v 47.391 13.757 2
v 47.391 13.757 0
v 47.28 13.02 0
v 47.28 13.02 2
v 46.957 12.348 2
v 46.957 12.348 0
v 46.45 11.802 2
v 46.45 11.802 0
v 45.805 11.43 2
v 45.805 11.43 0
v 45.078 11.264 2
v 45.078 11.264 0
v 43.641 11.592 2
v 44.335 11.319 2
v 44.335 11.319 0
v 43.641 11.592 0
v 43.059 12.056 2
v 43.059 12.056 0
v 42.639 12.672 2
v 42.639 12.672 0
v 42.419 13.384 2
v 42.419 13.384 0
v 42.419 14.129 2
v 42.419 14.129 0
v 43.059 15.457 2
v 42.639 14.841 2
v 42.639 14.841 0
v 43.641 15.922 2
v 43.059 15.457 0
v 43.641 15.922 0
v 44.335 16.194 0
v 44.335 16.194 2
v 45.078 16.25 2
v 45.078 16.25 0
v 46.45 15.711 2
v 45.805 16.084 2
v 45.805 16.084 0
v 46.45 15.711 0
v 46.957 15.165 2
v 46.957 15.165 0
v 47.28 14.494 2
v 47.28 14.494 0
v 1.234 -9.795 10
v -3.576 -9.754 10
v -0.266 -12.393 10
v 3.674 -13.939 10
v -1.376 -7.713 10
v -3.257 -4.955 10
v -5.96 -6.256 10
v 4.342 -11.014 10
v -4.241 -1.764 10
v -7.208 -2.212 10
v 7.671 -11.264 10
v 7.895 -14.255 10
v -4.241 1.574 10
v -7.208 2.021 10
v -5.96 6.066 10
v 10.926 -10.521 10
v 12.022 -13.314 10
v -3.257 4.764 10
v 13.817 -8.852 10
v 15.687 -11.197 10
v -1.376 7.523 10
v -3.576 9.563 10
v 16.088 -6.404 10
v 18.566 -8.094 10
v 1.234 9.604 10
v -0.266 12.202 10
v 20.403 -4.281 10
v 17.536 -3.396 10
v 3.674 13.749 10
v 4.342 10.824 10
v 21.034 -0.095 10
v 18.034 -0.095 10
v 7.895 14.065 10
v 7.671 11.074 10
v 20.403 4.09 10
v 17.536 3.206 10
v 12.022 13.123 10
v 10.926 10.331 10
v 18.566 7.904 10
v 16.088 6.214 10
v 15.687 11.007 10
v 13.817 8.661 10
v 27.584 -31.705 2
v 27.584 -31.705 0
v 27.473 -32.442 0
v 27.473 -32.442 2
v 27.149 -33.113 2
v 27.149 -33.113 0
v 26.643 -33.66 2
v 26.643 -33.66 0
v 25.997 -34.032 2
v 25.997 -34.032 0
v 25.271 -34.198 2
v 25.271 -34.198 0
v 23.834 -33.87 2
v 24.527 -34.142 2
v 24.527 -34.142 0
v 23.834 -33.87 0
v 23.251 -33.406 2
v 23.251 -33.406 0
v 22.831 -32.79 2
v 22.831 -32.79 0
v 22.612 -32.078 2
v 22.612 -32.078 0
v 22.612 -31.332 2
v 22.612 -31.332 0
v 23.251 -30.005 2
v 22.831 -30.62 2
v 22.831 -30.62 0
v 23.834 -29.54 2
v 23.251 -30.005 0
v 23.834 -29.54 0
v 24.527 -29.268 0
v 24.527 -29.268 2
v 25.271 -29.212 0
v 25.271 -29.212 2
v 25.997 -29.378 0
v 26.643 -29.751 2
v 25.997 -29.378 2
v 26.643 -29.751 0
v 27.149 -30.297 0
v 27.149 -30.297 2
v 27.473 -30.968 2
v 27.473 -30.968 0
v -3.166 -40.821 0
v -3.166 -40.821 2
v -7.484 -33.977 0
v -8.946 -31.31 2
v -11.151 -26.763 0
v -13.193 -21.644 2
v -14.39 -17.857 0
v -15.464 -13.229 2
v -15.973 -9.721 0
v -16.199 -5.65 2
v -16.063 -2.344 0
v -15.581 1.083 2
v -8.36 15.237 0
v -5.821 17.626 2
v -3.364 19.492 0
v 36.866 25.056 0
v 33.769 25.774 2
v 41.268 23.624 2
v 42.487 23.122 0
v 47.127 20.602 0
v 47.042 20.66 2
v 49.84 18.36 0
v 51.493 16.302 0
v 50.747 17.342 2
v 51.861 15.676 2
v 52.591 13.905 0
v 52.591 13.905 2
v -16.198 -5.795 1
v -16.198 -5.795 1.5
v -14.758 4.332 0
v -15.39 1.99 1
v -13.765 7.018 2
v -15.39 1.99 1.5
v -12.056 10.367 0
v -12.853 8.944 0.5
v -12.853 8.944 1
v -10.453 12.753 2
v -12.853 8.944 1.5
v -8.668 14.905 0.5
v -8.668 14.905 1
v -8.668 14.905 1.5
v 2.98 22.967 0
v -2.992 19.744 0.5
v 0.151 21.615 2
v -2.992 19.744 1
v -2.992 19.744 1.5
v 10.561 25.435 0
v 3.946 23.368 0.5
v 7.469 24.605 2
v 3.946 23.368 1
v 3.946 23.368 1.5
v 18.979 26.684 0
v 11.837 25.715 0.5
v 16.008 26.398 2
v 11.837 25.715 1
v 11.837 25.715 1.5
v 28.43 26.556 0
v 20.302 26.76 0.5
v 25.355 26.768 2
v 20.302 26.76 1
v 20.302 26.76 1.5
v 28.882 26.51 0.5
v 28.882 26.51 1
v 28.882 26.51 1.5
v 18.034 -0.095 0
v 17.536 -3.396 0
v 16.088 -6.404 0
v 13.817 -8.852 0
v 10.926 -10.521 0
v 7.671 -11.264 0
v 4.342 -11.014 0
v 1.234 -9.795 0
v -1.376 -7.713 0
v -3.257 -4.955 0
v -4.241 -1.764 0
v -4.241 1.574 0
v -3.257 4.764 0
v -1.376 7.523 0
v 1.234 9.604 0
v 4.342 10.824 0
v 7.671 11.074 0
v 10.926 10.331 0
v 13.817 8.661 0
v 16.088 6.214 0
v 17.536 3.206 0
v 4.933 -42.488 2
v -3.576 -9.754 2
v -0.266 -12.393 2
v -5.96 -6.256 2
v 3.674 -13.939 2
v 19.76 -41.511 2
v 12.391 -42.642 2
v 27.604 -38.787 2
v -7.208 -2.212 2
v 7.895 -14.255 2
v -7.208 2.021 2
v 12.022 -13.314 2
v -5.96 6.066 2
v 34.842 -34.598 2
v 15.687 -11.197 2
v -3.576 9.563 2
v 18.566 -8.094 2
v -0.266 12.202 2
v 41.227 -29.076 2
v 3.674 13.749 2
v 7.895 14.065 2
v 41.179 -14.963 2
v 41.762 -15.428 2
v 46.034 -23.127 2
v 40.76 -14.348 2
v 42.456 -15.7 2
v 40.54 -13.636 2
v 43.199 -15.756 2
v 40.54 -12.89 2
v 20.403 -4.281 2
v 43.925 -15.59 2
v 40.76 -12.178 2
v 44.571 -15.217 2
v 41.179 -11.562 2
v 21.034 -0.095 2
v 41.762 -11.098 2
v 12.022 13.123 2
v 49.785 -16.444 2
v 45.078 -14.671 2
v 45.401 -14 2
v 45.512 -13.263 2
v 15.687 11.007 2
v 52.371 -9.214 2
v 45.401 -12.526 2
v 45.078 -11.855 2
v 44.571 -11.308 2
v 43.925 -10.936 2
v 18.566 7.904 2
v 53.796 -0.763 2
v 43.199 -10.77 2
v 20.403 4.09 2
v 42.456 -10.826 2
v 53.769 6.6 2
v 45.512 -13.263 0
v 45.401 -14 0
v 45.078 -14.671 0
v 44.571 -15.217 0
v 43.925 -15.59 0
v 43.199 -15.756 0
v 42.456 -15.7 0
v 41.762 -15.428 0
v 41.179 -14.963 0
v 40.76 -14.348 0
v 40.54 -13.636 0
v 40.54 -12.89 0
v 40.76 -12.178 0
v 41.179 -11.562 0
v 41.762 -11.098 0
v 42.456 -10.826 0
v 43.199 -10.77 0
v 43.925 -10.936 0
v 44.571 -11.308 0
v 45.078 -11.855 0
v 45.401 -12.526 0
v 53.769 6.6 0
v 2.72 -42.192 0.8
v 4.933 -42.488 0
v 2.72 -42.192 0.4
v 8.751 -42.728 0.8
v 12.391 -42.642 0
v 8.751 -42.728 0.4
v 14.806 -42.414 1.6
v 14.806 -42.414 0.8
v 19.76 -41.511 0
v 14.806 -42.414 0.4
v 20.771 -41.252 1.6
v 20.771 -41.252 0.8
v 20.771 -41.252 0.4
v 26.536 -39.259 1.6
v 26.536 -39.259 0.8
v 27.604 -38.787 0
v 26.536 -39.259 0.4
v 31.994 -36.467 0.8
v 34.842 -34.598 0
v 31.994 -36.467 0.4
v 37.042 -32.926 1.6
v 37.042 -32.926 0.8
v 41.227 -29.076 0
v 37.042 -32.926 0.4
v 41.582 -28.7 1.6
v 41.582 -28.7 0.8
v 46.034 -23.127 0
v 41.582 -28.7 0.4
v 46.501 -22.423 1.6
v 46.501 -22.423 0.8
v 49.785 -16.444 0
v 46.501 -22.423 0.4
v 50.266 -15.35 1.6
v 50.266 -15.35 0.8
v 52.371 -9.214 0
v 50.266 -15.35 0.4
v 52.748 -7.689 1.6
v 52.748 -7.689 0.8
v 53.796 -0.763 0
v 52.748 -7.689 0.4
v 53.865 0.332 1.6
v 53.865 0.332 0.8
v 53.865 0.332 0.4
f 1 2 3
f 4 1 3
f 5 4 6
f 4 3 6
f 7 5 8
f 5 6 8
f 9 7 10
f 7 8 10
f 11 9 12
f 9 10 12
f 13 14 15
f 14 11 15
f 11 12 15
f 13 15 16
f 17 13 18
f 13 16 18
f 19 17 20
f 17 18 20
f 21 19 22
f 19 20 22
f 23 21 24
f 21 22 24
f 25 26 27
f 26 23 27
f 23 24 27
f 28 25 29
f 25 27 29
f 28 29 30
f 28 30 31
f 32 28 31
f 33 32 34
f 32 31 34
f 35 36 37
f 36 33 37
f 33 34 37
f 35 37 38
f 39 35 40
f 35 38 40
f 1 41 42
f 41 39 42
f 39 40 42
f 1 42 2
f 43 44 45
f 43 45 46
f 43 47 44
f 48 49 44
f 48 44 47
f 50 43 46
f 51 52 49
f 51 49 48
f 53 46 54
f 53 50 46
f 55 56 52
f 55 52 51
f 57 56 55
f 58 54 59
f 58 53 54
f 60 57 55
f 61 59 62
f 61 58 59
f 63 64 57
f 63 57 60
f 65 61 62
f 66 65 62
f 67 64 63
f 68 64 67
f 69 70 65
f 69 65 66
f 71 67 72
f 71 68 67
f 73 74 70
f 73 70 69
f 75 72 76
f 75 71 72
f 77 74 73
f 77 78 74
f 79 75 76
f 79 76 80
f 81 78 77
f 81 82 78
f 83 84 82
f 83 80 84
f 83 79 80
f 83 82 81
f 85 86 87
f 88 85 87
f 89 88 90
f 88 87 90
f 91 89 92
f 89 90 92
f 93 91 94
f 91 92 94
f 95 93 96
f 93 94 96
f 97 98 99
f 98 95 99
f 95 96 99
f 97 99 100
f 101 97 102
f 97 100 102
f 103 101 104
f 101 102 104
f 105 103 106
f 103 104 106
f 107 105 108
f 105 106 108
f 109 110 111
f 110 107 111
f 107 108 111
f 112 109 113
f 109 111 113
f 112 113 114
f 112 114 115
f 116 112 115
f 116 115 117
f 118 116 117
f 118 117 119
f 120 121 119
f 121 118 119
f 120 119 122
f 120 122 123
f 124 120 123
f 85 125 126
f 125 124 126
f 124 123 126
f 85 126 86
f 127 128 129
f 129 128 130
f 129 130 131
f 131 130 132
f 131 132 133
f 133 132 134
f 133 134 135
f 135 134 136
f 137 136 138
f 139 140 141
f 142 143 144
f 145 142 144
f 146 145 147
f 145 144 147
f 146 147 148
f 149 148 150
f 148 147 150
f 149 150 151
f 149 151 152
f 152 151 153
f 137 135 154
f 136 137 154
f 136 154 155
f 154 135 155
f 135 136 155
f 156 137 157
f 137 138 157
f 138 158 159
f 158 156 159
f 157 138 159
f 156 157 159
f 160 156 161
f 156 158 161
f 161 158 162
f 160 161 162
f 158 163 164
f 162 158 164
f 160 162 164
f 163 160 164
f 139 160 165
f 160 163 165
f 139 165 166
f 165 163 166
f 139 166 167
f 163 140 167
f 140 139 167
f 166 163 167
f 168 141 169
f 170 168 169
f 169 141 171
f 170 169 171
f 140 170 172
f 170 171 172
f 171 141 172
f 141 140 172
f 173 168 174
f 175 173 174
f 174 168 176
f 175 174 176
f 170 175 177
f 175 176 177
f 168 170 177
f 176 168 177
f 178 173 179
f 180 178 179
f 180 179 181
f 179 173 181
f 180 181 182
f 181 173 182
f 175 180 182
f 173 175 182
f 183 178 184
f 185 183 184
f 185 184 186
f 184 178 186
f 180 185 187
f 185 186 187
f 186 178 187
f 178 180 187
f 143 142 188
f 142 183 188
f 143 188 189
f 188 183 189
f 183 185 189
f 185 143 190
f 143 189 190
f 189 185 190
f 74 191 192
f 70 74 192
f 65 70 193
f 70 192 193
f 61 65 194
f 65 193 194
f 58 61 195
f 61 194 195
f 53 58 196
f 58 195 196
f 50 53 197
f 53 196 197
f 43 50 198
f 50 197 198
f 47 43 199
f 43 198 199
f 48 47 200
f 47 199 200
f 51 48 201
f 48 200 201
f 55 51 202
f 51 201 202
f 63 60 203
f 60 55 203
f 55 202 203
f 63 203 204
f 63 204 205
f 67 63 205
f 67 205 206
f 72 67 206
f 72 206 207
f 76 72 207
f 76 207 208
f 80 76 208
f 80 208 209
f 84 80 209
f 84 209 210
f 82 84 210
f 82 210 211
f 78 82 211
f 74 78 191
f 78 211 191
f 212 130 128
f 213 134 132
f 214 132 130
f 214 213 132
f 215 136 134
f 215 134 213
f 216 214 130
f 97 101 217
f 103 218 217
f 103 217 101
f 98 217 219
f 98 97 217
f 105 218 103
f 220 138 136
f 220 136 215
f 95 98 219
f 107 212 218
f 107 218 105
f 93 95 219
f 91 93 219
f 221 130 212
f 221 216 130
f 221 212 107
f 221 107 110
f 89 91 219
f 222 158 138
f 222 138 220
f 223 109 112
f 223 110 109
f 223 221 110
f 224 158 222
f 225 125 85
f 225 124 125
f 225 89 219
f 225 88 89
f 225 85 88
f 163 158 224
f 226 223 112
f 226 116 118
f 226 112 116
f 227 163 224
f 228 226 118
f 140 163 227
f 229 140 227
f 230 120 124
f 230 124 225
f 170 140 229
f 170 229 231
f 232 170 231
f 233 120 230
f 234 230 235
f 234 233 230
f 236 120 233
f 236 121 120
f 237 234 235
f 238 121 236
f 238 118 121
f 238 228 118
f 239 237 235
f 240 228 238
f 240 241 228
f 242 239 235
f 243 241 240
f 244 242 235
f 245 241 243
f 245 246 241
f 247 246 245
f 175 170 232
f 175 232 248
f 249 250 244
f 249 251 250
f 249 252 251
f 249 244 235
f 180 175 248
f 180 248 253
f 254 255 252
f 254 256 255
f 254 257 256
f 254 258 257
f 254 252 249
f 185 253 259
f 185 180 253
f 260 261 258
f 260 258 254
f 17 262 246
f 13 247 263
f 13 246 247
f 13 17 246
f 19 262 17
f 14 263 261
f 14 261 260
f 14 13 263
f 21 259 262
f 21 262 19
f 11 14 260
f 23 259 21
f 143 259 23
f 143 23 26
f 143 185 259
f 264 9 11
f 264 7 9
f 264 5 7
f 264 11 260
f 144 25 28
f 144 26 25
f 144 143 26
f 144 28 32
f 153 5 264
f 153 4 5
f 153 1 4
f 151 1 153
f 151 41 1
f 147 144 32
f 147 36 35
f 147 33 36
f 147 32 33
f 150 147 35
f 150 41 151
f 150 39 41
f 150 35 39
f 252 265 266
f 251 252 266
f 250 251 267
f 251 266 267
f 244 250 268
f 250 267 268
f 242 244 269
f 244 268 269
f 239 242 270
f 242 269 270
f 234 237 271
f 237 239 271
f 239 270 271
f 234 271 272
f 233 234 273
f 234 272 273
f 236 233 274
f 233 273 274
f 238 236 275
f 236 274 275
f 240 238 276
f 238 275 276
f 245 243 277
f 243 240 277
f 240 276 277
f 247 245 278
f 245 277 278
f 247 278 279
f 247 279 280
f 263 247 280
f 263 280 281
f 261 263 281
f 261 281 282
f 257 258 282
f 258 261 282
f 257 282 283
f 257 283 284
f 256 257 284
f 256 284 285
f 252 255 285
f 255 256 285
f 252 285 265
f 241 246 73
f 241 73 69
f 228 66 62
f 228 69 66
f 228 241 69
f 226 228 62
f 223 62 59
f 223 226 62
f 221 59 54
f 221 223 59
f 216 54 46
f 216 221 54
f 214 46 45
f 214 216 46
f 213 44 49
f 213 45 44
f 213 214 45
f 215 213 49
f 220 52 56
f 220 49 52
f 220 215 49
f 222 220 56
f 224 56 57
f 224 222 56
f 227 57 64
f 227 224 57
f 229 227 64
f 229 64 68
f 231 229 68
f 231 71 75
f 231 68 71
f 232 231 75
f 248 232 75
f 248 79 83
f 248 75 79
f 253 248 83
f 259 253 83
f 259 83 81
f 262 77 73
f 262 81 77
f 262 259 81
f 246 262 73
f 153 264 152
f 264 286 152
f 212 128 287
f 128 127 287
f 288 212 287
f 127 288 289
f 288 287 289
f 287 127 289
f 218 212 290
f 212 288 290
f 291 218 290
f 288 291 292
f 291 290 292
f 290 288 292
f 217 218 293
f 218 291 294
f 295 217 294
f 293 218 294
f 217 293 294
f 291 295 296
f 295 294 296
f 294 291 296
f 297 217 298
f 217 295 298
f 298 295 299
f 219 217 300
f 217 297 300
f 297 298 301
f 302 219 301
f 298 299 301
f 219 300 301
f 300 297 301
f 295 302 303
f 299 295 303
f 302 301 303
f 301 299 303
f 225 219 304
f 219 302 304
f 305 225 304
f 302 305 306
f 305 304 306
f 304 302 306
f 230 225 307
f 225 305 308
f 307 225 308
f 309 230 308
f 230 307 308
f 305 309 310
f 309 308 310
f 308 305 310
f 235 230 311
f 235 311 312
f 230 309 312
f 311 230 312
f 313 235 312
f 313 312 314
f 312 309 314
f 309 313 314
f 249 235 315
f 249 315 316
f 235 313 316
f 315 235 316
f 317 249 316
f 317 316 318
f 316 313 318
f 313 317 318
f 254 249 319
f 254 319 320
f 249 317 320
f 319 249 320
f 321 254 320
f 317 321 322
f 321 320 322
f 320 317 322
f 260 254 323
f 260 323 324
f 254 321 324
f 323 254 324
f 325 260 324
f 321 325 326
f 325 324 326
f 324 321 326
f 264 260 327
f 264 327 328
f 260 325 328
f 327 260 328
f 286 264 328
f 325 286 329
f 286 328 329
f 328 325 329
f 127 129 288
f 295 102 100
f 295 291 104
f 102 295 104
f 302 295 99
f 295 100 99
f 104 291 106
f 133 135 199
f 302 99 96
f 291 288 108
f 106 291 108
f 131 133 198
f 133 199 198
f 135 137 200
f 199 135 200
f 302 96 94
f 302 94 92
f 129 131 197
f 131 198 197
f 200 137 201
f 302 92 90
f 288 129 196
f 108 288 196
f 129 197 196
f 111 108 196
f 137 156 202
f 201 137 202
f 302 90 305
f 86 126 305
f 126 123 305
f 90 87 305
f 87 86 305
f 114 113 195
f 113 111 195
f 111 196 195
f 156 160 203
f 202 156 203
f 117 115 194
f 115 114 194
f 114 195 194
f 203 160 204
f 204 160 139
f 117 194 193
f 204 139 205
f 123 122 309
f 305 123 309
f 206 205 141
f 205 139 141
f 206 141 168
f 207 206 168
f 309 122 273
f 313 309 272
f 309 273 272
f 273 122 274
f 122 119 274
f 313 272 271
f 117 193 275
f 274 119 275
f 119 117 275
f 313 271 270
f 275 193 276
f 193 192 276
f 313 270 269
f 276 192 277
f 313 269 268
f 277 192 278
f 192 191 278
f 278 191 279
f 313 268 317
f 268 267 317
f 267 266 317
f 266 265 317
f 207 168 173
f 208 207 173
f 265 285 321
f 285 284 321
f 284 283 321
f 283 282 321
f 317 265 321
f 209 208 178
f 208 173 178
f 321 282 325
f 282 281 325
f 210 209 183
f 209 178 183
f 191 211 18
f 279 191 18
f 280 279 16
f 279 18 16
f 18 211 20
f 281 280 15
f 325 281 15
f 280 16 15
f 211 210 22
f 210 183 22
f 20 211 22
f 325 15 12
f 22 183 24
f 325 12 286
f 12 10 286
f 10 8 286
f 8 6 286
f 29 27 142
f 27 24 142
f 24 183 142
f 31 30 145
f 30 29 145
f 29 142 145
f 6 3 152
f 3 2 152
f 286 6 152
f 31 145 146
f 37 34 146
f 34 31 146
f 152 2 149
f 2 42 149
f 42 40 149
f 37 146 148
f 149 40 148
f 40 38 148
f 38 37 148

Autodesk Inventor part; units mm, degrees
ref_plane "YZ Plane" through (0, 0, 0) normal (1, 0, 0) x (0, 1, 0)
ref_plane "XZ Plane" through (0, 0, 0) normal (0, 1, 0) x (-1, 0, 0)
ref_plane "XY Plane" through (0, 0, 0) normal (0, 0, 1) x (1, 0, 0)
sketch "Sketch1" plane through (0, 0, 0) normal (0, 0, 1) x (1, 0, 0)
  circle A0 centre (25.0838, -31.7051) radius 2.5 projected
  circle A1 centre (43.012, -13.2629) radius 2.5 projected
  circle A2 centre (44.8914, 13.7567) radius 2.5 projected
  circle A3 centre (28.0838, 36.7109) radius 2.5 projected
  circle A4 centre (-0.8935, 43.7288) radius 2.5 projected
  circle A5 centre (-29.5533, 30.4373) radius 2.5 projected
  circle A6 centre (-43.6662, -0.0951) radius 2.5 projected
  circle A7 centre (-47.6662, -52.5951) radius 2.5 projected
  circle A8 centre (-10.6662, -52.5951) radius 2.5 projected
  circle A9 centre (6.8338, -0.0951) radius 4 projected
  line L0 (-3.1662, -60.0951) -> (-3.1662, -40.8213) projected
  spline S0 degree 4 poles (-3.1662, -40.8213) (8.3823, -44.3792) (29.645, -43.1708) (54.7055, -22.2338) (56.6662, 18.5311) (25.1104, 60.0951) (-26.25, 55.8136) (-50.0319, 24.6801) (-51.1662, -0.0951) knots -0.895347 -0.895347 -0.895347 -0.895347 -0.895347 -0.704438 -0.582312 -0.457579 -0.330099 0 0 0 0 0 projected
  line L1 (-51.1662, -0.0951) -> (-56.6662, -60.0951) projected
  line L2 (-56.6662, -60.0951) -> (-3.1662, -60.0951) projected
  circle A10 centre (6.8338, -0.0951) radius 11.2
  line L3 (-3.1662, -40.8213) -> (-29.9162, -34.2051) construction
  line L4 (-29.9162, -34.2051) -> (-46.1662, -23.5051) construction
  line L5 (-46.1662, -23.5051) -> (-51.1662, -0.0951) construction
  spline S1 degree 3 poles (-3.1662, -40.8213) (-29.9162, -34.2051) (-46.1662, -23.5051) (-51.1662, -0.0951) knots 1 1 1 1 2 2 2 2
  point P0 (0, 0)
  dimension "d0" = 22.4
extrude "Extrusion1" add sketch "Sketch1" along normal blind 2 contours S1 S0
sketch "Sketch2" plane through (0, 0, 2) normal (0, 0, 1) x (1, 0, 0)
  point P0 (0, 0)
sketch "Sketch3" plane through (0, 0, 2) normal (0, 0, 1) x (1, 0, 0)
  circle A0 centre (6.8338, -0.0951) radius 11.2 projected
  circle A1 centre (6.8338, -0.0951) radius 14.2
  point P0 (0, 0)
  dimension "d3" = 3
extrude "Extrusion2" add sketch "Sketch3" along normal blind 8
sketch "Sketch4" plane through (0, 0, 2) normal (0, 0, 1) x (1, 0, 0)
  spline S0 degree 4 poles (-3.1662, -40.8213) (-27.2692, -5.9695) (-29.39, 39.4497) (49.0675, 34.0752) (52.786, 13.0688) knots 0 0 0 0 0 1 1 1 1 1
  circle A0 centre (6.8338, -0.0951) radius 14.2 projected
  spline S1 degree 4 poles (-3.1662, -40.8213) (8.3823, -44.3792) (29.645, -43.1708) (54.7055, -22.2338) (56.6662, 18.5311) (25.1104, 60.0951) (-26.25, 55.8136) (-50.0319, 24.6801) (-51.1662, -0.0951) knots 0 0 0 0 0 0.213223 0.349624 0.488937 0.631318 1 1 1 1 1 projected
  spline S2 degree 3 poles (-51.1662, -0.0951) (-46.1662, -23.5051) (-29.9162, -34.2051) (-3.1662, -40.8213) knots 0 0 0 0 1 1 1 1 projected
  circle A1 centre (-43.6662, -0.0951) radius 2.5 projected
  circle A2 centre (-29.5533, 30.4373) radius 2.5 projected
  circle A3 centre (-0.8935, 43.7288) radius 2.5 projected
  circle A4 centre (28.0838, 36.7109) radius 2.5 projected
  circle A5 centre (44.8914, 13.7567) radius 2.5 projected
  circle A6 centre (43.012, -13.2629) radius 2.5 projected
  circle A7 centre (25.0838, -31.7051) radius 2.5 projected
  point P0 (0, 0)
  point P1 (-15.7615, 0.0764)
  point P2 (0.4982, 21.7961)
  point P3 (35.8374, 25.3182)
  point P4 (52.5916, 13.9044)
extrude "Extrusion3" cut sketch "Sketch4" against normal blind 8 contours S2 S1 S0
properties part number "Estructura"
